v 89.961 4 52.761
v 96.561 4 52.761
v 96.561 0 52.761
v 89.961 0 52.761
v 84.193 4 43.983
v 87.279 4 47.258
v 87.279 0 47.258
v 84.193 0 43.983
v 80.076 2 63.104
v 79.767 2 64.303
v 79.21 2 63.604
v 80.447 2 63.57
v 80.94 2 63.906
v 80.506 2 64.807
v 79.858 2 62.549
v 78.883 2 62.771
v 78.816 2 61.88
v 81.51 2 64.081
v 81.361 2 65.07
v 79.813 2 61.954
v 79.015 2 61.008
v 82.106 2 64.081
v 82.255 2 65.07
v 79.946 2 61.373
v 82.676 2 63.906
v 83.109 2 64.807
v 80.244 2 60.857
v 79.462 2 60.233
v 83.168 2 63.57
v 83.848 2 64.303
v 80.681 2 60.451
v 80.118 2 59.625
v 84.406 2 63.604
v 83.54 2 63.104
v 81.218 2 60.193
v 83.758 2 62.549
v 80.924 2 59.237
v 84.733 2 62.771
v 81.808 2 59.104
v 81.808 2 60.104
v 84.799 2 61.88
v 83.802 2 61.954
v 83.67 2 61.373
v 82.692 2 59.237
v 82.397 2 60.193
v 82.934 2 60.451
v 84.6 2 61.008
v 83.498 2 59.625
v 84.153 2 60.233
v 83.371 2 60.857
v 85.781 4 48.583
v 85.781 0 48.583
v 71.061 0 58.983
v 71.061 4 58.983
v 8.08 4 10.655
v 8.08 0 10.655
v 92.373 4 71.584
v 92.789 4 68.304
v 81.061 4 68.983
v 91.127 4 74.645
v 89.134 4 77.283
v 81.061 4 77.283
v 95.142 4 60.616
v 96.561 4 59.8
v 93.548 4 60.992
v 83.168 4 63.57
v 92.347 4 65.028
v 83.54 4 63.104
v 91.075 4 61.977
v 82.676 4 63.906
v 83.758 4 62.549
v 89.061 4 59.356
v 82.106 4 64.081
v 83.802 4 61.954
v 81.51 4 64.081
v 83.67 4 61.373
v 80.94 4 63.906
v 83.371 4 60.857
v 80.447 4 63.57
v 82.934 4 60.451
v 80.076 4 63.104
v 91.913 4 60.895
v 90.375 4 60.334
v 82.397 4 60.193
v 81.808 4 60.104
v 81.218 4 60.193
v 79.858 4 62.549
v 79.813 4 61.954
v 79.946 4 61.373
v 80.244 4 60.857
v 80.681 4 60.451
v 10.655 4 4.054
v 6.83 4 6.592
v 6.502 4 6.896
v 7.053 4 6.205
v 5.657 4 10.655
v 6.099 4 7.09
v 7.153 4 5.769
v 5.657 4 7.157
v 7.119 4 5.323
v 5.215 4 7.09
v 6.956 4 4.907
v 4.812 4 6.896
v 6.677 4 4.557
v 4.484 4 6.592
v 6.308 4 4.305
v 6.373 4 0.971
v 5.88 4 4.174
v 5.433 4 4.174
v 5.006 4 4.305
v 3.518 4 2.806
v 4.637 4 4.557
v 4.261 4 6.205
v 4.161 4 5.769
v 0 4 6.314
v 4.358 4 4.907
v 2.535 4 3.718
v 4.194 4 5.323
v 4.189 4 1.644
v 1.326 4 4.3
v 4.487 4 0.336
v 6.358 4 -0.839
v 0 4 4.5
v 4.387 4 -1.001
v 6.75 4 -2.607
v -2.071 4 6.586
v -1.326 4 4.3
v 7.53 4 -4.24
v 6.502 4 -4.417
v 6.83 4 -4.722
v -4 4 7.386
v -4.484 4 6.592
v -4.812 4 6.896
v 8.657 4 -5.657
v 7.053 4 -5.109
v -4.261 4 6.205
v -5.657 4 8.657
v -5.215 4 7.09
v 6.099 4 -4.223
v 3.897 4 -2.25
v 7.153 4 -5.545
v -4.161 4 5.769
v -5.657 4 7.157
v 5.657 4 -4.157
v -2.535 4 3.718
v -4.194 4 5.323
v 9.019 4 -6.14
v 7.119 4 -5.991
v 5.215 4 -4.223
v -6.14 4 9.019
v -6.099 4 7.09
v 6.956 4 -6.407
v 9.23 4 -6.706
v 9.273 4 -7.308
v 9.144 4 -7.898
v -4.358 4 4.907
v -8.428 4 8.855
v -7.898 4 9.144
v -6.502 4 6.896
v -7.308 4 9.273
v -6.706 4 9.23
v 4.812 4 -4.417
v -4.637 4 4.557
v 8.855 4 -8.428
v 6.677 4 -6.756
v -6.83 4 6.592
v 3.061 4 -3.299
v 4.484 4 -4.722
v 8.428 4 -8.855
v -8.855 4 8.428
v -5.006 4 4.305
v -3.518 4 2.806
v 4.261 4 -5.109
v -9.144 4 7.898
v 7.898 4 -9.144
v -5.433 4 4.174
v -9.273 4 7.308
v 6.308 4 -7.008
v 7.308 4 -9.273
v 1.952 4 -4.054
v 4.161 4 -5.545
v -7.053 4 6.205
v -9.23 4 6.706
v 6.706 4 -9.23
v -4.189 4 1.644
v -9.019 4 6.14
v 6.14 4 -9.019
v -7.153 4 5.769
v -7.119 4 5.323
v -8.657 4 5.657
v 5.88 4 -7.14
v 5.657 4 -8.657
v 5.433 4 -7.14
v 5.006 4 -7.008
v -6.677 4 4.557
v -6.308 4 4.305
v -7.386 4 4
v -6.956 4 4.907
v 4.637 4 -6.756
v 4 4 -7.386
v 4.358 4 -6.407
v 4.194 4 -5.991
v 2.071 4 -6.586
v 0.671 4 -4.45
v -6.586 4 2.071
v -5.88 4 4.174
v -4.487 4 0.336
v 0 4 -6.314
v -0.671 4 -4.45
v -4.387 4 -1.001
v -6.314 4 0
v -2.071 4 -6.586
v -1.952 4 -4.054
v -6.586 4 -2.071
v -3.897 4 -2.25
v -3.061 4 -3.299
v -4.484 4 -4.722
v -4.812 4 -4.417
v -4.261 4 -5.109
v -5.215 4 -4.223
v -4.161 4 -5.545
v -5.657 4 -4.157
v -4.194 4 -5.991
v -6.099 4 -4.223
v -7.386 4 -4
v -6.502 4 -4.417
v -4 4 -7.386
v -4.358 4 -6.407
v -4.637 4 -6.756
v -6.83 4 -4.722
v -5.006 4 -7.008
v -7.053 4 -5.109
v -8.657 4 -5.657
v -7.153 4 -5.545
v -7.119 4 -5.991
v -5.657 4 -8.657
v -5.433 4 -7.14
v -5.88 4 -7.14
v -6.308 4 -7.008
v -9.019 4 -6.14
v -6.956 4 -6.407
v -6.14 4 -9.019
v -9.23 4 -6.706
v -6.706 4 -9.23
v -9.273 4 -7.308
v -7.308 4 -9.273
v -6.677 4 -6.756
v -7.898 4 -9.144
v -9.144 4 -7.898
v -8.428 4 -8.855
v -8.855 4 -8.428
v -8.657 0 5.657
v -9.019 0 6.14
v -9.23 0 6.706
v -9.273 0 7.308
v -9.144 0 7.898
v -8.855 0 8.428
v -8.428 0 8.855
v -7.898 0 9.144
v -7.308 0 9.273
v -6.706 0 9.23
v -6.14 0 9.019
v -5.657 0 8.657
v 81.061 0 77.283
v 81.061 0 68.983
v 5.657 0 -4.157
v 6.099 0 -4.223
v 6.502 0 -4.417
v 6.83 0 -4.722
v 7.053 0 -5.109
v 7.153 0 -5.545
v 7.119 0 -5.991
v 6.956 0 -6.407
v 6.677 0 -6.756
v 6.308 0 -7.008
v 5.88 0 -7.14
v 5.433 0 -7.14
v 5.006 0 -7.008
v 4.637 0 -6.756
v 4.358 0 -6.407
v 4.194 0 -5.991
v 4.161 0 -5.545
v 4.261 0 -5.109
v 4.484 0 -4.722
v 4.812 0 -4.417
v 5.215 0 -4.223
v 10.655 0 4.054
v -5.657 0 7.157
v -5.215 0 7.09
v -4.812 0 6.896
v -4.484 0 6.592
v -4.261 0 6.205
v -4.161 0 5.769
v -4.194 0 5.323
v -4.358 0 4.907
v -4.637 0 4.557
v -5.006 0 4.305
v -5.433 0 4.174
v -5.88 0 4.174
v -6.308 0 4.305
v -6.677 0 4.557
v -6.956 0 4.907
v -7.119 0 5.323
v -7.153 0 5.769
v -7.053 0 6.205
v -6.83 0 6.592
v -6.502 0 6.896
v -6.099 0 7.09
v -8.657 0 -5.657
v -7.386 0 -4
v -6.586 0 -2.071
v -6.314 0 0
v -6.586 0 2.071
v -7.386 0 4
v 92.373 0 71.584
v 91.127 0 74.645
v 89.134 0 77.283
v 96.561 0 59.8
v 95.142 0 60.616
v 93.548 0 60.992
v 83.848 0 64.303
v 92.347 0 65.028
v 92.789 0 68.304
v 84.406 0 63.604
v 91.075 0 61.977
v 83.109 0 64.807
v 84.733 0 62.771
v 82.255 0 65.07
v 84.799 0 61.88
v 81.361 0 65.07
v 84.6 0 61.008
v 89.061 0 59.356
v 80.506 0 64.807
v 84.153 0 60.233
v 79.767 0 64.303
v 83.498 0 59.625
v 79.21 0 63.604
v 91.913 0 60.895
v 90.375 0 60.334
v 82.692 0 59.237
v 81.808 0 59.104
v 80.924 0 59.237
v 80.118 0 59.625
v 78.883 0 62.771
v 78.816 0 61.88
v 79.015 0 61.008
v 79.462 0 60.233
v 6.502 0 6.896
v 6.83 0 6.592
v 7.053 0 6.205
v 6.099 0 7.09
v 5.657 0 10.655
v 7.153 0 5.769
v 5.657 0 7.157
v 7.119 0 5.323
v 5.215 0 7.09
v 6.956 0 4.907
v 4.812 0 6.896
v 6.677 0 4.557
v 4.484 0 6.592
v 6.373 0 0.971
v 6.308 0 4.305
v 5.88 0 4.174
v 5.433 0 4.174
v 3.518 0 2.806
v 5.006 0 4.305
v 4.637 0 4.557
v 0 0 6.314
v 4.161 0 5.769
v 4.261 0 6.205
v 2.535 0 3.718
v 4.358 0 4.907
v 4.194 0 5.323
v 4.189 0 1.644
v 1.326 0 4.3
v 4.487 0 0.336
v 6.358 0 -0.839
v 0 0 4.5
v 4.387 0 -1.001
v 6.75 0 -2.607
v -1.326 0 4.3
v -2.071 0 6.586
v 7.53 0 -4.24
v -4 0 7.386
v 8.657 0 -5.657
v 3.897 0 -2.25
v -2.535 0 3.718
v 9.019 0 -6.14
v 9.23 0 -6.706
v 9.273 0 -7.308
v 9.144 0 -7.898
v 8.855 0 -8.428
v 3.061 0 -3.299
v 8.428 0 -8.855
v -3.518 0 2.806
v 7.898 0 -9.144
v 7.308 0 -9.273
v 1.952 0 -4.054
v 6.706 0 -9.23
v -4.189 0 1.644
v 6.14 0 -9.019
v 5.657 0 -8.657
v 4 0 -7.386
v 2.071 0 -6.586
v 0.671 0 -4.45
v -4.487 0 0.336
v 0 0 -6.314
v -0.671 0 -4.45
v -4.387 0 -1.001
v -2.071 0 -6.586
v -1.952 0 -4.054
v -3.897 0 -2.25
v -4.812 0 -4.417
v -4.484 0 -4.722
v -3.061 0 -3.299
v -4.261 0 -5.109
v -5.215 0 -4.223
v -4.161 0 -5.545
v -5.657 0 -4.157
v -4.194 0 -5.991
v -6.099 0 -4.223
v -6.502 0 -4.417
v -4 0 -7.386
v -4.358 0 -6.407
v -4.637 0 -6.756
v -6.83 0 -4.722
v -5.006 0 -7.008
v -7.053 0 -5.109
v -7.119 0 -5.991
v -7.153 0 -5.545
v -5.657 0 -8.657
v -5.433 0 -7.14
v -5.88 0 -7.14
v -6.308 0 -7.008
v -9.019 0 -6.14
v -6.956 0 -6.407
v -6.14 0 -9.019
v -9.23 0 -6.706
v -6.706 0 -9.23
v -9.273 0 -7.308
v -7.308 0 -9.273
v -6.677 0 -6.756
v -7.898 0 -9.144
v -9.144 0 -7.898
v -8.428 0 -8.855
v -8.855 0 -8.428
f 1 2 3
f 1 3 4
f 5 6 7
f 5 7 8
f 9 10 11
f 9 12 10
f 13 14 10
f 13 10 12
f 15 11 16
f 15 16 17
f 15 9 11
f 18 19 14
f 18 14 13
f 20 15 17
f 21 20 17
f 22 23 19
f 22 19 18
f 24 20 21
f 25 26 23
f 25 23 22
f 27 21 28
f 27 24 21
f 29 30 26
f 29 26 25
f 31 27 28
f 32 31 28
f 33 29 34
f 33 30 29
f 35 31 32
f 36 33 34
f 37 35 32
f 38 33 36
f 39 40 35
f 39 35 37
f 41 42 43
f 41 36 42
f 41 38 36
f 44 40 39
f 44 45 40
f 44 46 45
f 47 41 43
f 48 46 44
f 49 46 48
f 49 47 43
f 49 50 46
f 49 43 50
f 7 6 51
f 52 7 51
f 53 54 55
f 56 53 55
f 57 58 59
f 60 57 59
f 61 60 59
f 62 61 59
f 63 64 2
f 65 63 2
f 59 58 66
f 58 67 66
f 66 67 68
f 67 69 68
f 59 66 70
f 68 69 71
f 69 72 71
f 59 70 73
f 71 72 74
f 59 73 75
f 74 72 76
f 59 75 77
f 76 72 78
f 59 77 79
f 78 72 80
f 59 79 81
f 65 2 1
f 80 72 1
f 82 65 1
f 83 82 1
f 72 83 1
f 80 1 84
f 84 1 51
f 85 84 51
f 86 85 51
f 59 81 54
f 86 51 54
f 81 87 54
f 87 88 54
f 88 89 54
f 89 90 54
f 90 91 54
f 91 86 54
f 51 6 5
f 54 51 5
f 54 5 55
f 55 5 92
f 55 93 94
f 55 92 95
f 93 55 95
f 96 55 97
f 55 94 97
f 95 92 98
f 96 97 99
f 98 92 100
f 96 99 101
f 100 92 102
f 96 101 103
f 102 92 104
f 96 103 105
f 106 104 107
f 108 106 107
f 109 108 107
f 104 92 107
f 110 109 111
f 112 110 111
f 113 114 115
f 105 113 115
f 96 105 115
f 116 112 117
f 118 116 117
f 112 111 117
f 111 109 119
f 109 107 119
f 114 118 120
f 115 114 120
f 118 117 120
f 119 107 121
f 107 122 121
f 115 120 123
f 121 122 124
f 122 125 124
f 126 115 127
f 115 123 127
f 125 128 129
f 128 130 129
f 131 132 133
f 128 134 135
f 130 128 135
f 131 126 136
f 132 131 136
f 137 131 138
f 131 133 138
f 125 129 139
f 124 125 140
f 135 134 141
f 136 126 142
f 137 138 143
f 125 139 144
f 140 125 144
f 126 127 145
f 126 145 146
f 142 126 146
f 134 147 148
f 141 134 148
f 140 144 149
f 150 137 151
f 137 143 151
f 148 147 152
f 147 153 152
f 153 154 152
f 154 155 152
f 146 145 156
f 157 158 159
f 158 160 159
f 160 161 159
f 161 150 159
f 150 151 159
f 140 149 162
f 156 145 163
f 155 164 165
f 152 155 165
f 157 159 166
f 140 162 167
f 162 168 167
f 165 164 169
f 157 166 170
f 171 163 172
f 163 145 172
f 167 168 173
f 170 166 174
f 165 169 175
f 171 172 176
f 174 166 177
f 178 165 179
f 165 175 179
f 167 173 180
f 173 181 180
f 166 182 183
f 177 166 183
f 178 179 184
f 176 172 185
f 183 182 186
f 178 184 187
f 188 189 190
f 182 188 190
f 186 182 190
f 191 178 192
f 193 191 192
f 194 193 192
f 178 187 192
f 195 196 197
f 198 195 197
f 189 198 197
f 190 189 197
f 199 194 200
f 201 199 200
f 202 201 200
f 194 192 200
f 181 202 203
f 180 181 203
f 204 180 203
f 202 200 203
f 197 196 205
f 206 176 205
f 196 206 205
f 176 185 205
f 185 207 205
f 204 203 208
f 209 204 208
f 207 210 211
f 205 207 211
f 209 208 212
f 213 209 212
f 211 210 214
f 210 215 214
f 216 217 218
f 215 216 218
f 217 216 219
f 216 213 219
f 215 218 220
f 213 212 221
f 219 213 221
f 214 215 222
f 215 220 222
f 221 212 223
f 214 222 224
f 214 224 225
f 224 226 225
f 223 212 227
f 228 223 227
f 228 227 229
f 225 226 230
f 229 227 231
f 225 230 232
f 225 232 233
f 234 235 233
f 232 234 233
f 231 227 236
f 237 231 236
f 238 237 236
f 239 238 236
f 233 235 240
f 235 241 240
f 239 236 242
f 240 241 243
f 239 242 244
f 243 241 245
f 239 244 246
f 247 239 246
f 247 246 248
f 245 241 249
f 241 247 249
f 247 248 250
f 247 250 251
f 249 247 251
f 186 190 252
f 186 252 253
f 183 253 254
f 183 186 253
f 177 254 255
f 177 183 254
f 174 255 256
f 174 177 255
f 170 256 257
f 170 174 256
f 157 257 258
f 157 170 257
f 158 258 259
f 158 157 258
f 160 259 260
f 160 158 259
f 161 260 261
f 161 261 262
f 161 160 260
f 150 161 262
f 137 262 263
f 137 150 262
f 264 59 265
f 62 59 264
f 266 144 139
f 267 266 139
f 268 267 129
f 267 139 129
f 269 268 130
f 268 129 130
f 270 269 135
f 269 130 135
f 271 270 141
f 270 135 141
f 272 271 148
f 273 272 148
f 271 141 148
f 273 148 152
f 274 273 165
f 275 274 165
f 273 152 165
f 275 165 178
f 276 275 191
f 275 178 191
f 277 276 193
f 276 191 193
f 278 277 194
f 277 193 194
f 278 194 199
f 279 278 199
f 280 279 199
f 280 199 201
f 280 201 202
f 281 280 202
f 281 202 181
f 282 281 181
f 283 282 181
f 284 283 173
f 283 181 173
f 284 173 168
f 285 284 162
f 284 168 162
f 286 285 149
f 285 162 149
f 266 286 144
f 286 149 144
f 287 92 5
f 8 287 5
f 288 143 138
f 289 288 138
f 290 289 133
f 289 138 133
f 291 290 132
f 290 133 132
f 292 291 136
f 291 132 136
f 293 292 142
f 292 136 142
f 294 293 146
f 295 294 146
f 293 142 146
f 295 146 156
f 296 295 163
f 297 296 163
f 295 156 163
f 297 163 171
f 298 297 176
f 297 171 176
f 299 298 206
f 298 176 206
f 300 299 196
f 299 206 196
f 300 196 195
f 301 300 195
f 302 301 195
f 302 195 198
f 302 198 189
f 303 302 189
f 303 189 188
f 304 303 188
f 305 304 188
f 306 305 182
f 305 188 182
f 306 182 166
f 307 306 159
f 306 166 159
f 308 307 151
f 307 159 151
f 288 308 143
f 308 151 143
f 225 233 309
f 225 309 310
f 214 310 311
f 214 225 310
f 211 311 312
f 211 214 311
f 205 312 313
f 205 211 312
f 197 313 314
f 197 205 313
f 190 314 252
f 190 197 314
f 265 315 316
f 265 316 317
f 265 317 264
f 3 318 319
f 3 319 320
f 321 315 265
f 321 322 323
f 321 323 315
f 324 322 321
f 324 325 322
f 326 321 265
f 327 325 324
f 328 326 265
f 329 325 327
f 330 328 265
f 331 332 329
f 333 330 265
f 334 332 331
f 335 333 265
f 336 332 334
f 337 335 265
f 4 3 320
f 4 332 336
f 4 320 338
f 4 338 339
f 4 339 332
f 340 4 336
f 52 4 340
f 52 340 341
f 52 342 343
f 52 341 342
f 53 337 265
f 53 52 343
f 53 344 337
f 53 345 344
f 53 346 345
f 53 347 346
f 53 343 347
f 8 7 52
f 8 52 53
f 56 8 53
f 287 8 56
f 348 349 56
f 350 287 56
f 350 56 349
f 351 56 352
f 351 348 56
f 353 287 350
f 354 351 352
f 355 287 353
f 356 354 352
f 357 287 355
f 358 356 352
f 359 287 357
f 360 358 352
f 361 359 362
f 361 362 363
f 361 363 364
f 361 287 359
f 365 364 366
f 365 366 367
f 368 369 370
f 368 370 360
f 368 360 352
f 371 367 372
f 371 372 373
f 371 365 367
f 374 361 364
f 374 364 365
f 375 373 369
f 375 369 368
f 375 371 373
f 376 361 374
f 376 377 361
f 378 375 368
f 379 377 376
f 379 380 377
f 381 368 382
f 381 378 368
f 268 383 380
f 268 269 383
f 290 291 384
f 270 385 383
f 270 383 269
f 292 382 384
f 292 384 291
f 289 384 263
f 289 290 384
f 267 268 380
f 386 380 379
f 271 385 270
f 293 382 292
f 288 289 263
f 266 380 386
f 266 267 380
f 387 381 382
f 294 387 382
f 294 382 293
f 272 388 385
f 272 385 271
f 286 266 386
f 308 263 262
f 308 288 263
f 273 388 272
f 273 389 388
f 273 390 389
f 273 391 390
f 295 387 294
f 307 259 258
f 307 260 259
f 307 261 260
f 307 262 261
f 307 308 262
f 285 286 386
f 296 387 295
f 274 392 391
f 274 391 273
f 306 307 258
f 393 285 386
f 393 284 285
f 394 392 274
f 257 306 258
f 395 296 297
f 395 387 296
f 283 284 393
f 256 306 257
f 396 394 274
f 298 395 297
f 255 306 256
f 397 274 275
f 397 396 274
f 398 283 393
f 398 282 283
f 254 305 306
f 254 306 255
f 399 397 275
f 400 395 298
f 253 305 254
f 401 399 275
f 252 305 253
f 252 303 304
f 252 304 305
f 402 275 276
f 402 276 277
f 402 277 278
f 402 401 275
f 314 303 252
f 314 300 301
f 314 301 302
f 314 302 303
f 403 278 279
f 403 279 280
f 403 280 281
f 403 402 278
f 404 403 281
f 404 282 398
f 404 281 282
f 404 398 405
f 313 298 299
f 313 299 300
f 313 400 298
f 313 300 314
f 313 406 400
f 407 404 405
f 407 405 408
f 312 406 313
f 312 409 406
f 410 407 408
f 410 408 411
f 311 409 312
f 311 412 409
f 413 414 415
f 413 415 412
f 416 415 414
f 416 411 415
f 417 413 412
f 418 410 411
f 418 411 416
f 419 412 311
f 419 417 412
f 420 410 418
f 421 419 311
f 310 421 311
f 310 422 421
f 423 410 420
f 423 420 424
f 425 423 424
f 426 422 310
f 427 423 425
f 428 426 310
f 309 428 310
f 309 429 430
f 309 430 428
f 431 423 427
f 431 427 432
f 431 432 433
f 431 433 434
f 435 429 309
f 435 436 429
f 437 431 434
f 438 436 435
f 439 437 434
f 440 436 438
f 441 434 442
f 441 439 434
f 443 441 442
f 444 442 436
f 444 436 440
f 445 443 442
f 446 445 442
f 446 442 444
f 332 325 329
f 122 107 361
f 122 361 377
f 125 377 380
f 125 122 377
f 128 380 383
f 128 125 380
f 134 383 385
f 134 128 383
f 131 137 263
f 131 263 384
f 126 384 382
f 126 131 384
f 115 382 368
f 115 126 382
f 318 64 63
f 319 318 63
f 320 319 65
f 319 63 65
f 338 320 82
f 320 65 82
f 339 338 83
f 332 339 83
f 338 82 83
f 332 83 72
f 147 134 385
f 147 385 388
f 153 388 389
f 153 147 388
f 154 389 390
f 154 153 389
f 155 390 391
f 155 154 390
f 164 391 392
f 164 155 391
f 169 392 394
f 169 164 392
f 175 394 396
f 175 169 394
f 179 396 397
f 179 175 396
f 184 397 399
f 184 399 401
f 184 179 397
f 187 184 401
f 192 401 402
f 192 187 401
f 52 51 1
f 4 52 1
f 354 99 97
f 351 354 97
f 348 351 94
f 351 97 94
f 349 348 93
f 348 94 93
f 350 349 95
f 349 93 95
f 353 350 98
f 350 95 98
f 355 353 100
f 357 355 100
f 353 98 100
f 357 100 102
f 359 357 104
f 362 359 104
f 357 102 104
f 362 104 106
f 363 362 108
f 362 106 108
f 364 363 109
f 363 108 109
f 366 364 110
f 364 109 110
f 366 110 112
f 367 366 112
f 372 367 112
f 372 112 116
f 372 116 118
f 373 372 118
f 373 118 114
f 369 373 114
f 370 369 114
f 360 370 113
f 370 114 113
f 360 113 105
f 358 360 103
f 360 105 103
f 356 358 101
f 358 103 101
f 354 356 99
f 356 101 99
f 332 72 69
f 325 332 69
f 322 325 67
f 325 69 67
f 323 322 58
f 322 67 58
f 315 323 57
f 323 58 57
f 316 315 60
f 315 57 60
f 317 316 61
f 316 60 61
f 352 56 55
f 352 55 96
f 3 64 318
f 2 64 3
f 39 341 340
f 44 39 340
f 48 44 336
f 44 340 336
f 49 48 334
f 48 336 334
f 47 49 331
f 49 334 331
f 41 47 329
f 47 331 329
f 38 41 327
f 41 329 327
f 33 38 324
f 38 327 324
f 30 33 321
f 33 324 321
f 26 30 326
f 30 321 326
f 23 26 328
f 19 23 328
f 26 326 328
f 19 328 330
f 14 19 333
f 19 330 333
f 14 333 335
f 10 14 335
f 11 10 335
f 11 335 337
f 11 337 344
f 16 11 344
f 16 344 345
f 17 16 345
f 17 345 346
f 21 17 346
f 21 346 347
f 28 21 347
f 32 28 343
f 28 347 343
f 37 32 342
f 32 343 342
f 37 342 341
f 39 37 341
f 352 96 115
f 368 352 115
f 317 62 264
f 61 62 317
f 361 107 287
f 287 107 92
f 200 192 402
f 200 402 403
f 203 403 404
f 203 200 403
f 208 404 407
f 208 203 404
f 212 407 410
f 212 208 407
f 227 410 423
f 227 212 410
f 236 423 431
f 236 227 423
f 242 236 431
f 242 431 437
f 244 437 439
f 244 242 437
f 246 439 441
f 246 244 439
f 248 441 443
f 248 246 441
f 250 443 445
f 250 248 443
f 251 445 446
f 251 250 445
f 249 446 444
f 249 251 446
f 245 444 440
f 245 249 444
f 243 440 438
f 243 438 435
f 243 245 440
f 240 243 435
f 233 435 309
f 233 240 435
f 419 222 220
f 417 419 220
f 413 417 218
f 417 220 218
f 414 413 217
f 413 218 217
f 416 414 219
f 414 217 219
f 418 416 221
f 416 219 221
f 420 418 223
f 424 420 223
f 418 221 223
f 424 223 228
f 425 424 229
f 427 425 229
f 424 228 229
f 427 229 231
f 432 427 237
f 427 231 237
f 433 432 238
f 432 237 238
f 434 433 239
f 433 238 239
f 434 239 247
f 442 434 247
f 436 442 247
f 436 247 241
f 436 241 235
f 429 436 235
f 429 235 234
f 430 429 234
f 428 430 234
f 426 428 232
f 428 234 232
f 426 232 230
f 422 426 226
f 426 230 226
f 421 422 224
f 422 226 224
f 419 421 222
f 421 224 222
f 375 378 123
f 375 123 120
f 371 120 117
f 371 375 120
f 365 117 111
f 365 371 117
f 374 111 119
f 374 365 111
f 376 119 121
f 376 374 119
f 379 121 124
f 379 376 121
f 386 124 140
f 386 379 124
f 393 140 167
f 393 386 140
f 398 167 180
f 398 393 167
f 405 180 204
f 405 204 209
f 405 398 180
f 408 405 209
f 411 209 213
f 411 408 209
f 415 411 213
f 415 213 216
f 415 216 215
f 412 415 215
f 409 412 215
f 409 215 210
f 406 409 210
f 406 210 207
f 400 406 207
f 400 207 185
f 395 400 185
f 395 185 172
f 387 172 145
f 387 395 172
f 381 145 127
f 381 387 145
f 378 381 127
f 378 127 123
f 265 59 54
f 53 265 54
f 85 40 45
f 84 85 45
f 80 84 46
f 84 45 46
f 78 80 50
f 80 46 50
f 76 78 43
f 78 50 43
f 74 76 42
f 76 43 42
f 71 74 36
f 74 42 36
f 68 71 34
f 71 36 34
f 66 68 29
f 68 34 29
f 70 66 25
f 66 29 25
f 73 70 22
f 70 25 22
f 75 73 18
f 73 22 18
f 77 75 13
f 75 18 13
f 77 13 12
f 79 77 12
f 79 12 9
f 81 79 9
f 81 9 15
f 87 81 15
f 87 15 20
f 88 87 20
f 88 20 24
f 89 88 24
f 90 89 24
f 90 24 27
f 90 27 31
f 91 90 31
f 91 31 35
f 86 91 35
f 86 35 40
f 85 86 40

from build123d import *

# Parameters (mm, degrees)
SKETCH1_W            = 16.31
SKETCH1_H            = 16.31
SKETCH1_R            = 4.5
BOSS_EXTRUDE1_DEPTH  = 4
SKETCH3_R            = 1.5
CUT_EXTRUDE1_DEPTH   = 4
BOSS_EXTRUDE2_DEPTH  = 4
BOSS_EXTRUDE6_DEPTH  = 4
CUT_EXTRUDE3_DEPTH   = 4
BOSS_EXTRUDE7_DEPTH  = 4
BOSS_EXTRUDE9_DEPTH  = 4
SKETCH17_OUTSIDE_W   = 136.165
SKETCH17_OUTSIDE_H   = 117.232
CUT_EXTRUDE4_DEPTH   = 4
SKETCH18_R           = 1.5
BOSS_EXTRUDE10_DEPTH = 4
CUT_EXTRUDE5_DEPTH   = 4
SKETCH20_R           = 2
CUT_EXTRUDE6_DEPTH   = 10
SKETCH21_R           = 3
CUT_EXTRUDE7_DEPTH   = 2


with BuildPart() as part:
    # Sketch1 → Boss-Extrude1 (new body)
    with BuildSketch(Plane(origin=(0, 0, 0), x_dir=(1, 0, 0), z_dir=(0, 1, 0))):
        Rectangle(SKETCH1_W, SKETCH1_H)
        with Locations(Location((0, 0, 0), (0, 0, 270))):
            Circle(SKETCH1_R, mode=Mode.SUBTRACT)
    extrude(amount=BOSS_EXTRUDE1_DEPTH)

    # Sketch3 → Cut-Extrude1 (cut)
    with BuildSketch(Plane(origin=(0, 4, 0), x_dir=(1, 0, 0), z_dir=(0, 1, 0))):
        with Locations(Location((5.656854249, 5.656854249, 0), (0, 0, 270))):
            Circle(SKETCH3_R)
        with Locations(Location((5.656854249, -5.656854249, 0), (0, 0, 270))):
            Circle(SKETCH3_R)
        with Locations(Location((-5.656854249, -5.656854249, 0), (0, 0, 270))):
            Circle(SKETCH3_R)
        with Locations(Location((-5.656854249, 5.656854249, 0), (0, 0, 270))):
            Circle(SKETCH3_R)
    extrude(amount=-CUT_EXTRUDE1_DEPTH, mode=Mode.SUBTRACT)

    # Sketch4 → Boss-Extrude2 (add)
    with BuildSketch(Plane(origin=(0, 4, 0), x_dir=(1, 0, 0), z_dir=(0, 1, 0))):
        Polygon((8.155, -8.155), (0, -8.155), (0, -10.655), (10.655, -10.655), (10.655, 0), (8.155, 0), align=None)
    extrude(amount=-BOSS_EXTRUDE2_DEPTH)

    # Sketch9 → Boss-Extrude6 (add)
    with BuildSketch(Plane(origin=(0, 4, 0), x_dir=(1, 0, 0), z_dir=(0, 1, 0))):
        Polygon((71.061407011, -58.982568069), (7.593139788, -10.281653748), (10.613791504, -4.032054751), (84.193483815, -43.982568069), (90.501950314, -50.291034568), (96.061407011, -50.291034568), (96.061407011, -73.982568069), (81.061407011, -73.982568069), (81.061407011, -68.982568069), align=None)
    extrude(amount=-BOSS_EXTRUDE6_DEPTH)

    # Sketch12 → Cut-Extrude3 (cut)
    with BuildSketch(Plane(origin=(0, 4, 0), x_dir=(1, 0, 0), z_dir=(0, 1, 0))):
        Polygon((87.278639473, -47.258318902), (85.780514725, -48.583317861), (89.960889469, -52.761034568), (90.501950314, -52.761034568), (96.061407011, -52.761034568), (96.061407011, -50.291034568), (90.501950314, -50.291034568), (87.347717064, -47.136801318), align=None)
    extrude(amount=-CUT_EXTRUDE3_DEPTH, mode=Mode.SUBTRACT)

    # Sketch13 → Boss-Extrude7 (add)
    with BuildSketch(Plane(origin=(0, 4, 0), x_dir=(1, 0, 0), z_dir=(0, 1, 0))):
        Polygon((81.061407011, -73.982568069), (81.061407011, -77.282568069), (96.561407011, -77.282568069), (96.561407011, -52.761034568), (96.061407011, -52.761034568), (96.061407011, -73.982568069), align=None)
    extrude(amount=-BOSS_EXTRUDE7_DEPTH)

    # Sketch16 → Boss-Extrude9 (add)
    with BuildSketch(Plane(origin=(0, 4, 0), x_dir=(1, 0, 0), z_dir=(0, 1, 0))):
        Polygon((0, -10.655), (-10, -10.655), (-10, 10.345), (10.655, 10.345), (10.655, 0), (8.155, 0), (8.155, 8.155), (-8.155, 8.155), (-8.155, -8.155), (0, -8.155), align=None)
    extrude(amount=-BOSS_EXTRUDE9_DEPTH)

    # Sketch17 outside → Cut-Extrude4 (cut)
    with BuildSketch(Plane(origin=(0, 4, 0), x_dir=(1, 0, 0), z_dir=(0, 1, 0))):
        with Locations((43.2805, -33.469)):
            Rectangle(SKETCH17_OUTSIDE_W, SKETCH17_OUTSIDE_H)
        with BuildLine():
            Line((5.656854249, -8.656854249), (5.656854249, -10.655))
            Line((5.656854249, -10.655), (8.079694096, -10.655))
            Line((8.079694096, -10.655), (71.061407011, -58.982568069))
            Line((71.061407011, -58.982568069), (81.061407011, -68.982568069))
            Line((81.061407011, -68.982568069), (81.061407011, -77.282568069))
            Line((81.061407011, -77.282568069), (96.561407011, -77.282568069))
            Line((96.561407011, -77.282568069), (96.561407011, -52.761034568))
            Line((96.561407011, -52.761034568), (89.960889469, -52.761034568))
            Line((89.960889469, -52.761034568), (85.780514725, -48.583317861))
            Line((85.780514725, -48.583317861), (87.278639473, -47.258318902))
            Line((87.278639473, -47.258318902), (84.193483815, -43.982568069))
            Line((84.193483815, -43.982568069), (10.655, -4.054429139))
            Line((10.655, -4.054429139), (8.656854249, -5.656854249))
            ThreePointArc((8.656854249, -5.656854249), (6.313708499, 0), (8.656854249, 5.656854249))
            ThreePointArc((8.656854249, 5.656854249), (8.656854249, 8.656854249), (5.656854249, 8.656854249))
            ThreePointArc((5.656854249, 8.656854249), (0, 6.313708499), (-5.656854249, 8.656854249))
            ThreePointArc((-5.656854249, 8.656854249), (-8.656854249, 8.656854249), (-8.656854249, 5.656854249))
            ThreePointArc((-8.656854249, 5.656854249), (-6.313708499, 0), (-8.656854249, -5.656854249))
            ThreePointArc((-8.656854249, -5.656854249), (-8.656854249, -8.656854249), (-5.656854249, -8.656854249))
            ThreePointArc((-5.656854249, -8.656854249), (0, -6.313708499), (5.656854249, -8.656854249))
        make_face(mode=Mode.SUBTRACT)
    extrude(amount=-CUT_EXTRUDE4_DEPTH, mode=Mode.SUBTRACT)

    # Sketch18 → Boss-Extrude10 (add)
    with BuildSketch(Plane(origin=(0, 4, 0), x_dir=(1, 0, 0), z_dir=(0, 1, 0))):
        Polygon((5.656854249, -10.655), (0, -6.313708499), (6.372805828, -0.97060021), (10.655, -4.054429139), (8.656854249, -5.656854249), align=None)
        with Locations(Location((5.656854249, -5.656854249, 0), (0, 0, 270))):
            Circle(SKETCH18_R, mode=Mode.SUBTRACT)
    extrude(amount=-BOSS_EXTRUDE10_DEPTH)

    # Sketch19 → Cut-Extrude5 (cut)
    with BuildSketch(Plane(origin=(0, 4, 0), x_dir=(1, 0, 0), z_dir=(0, 1, 0))):
        with BuildLine():
            Line((97.061407011, -77.355955856), (97.061407011, -59.355955856))
            ThreePointArc((97.061407011, -59.355955856), (93.061407011, -61.012810105), (89.061407011, -59.355955856))
            ThreePointArc((89.061407011, -59.355955856), (92.789329073, -68.355955856), (89.061407011, -77.355955856))
            Line((89.061407011, -77.355955856), (97.061407011, -77.355955856))
        make_face()
    extrude(amount=-CUT_EXTRUDE5_DEPTH, mode=Mode.SUBTRACT)

    # Sketch20 → Cut-Extrude6 (cut)
    with BuildSketch(Plane.XZ):
        with Locations(Location((81.807805677, 62.103797793, 0), (0, 0, 270))):
            Circle(SKETCH20_R)
    extrude(amount=-CUT_EXTRUDE6_DEPTH, mode=Mode.SUBTRACT)

    # Sketch21 → Cut-Extrude7 (cut)
    with BuildSketch(Plane.XZ):
        with Locations(Location((81.807805677, 62.103797793, 0), (0, 0, 270))):
            Circle(SKETCH21_R)
    extrude(amount=-CUT_EXTRUDE7_DEPTH, mode=Mode.SUBTRACT)


solid = part.part
